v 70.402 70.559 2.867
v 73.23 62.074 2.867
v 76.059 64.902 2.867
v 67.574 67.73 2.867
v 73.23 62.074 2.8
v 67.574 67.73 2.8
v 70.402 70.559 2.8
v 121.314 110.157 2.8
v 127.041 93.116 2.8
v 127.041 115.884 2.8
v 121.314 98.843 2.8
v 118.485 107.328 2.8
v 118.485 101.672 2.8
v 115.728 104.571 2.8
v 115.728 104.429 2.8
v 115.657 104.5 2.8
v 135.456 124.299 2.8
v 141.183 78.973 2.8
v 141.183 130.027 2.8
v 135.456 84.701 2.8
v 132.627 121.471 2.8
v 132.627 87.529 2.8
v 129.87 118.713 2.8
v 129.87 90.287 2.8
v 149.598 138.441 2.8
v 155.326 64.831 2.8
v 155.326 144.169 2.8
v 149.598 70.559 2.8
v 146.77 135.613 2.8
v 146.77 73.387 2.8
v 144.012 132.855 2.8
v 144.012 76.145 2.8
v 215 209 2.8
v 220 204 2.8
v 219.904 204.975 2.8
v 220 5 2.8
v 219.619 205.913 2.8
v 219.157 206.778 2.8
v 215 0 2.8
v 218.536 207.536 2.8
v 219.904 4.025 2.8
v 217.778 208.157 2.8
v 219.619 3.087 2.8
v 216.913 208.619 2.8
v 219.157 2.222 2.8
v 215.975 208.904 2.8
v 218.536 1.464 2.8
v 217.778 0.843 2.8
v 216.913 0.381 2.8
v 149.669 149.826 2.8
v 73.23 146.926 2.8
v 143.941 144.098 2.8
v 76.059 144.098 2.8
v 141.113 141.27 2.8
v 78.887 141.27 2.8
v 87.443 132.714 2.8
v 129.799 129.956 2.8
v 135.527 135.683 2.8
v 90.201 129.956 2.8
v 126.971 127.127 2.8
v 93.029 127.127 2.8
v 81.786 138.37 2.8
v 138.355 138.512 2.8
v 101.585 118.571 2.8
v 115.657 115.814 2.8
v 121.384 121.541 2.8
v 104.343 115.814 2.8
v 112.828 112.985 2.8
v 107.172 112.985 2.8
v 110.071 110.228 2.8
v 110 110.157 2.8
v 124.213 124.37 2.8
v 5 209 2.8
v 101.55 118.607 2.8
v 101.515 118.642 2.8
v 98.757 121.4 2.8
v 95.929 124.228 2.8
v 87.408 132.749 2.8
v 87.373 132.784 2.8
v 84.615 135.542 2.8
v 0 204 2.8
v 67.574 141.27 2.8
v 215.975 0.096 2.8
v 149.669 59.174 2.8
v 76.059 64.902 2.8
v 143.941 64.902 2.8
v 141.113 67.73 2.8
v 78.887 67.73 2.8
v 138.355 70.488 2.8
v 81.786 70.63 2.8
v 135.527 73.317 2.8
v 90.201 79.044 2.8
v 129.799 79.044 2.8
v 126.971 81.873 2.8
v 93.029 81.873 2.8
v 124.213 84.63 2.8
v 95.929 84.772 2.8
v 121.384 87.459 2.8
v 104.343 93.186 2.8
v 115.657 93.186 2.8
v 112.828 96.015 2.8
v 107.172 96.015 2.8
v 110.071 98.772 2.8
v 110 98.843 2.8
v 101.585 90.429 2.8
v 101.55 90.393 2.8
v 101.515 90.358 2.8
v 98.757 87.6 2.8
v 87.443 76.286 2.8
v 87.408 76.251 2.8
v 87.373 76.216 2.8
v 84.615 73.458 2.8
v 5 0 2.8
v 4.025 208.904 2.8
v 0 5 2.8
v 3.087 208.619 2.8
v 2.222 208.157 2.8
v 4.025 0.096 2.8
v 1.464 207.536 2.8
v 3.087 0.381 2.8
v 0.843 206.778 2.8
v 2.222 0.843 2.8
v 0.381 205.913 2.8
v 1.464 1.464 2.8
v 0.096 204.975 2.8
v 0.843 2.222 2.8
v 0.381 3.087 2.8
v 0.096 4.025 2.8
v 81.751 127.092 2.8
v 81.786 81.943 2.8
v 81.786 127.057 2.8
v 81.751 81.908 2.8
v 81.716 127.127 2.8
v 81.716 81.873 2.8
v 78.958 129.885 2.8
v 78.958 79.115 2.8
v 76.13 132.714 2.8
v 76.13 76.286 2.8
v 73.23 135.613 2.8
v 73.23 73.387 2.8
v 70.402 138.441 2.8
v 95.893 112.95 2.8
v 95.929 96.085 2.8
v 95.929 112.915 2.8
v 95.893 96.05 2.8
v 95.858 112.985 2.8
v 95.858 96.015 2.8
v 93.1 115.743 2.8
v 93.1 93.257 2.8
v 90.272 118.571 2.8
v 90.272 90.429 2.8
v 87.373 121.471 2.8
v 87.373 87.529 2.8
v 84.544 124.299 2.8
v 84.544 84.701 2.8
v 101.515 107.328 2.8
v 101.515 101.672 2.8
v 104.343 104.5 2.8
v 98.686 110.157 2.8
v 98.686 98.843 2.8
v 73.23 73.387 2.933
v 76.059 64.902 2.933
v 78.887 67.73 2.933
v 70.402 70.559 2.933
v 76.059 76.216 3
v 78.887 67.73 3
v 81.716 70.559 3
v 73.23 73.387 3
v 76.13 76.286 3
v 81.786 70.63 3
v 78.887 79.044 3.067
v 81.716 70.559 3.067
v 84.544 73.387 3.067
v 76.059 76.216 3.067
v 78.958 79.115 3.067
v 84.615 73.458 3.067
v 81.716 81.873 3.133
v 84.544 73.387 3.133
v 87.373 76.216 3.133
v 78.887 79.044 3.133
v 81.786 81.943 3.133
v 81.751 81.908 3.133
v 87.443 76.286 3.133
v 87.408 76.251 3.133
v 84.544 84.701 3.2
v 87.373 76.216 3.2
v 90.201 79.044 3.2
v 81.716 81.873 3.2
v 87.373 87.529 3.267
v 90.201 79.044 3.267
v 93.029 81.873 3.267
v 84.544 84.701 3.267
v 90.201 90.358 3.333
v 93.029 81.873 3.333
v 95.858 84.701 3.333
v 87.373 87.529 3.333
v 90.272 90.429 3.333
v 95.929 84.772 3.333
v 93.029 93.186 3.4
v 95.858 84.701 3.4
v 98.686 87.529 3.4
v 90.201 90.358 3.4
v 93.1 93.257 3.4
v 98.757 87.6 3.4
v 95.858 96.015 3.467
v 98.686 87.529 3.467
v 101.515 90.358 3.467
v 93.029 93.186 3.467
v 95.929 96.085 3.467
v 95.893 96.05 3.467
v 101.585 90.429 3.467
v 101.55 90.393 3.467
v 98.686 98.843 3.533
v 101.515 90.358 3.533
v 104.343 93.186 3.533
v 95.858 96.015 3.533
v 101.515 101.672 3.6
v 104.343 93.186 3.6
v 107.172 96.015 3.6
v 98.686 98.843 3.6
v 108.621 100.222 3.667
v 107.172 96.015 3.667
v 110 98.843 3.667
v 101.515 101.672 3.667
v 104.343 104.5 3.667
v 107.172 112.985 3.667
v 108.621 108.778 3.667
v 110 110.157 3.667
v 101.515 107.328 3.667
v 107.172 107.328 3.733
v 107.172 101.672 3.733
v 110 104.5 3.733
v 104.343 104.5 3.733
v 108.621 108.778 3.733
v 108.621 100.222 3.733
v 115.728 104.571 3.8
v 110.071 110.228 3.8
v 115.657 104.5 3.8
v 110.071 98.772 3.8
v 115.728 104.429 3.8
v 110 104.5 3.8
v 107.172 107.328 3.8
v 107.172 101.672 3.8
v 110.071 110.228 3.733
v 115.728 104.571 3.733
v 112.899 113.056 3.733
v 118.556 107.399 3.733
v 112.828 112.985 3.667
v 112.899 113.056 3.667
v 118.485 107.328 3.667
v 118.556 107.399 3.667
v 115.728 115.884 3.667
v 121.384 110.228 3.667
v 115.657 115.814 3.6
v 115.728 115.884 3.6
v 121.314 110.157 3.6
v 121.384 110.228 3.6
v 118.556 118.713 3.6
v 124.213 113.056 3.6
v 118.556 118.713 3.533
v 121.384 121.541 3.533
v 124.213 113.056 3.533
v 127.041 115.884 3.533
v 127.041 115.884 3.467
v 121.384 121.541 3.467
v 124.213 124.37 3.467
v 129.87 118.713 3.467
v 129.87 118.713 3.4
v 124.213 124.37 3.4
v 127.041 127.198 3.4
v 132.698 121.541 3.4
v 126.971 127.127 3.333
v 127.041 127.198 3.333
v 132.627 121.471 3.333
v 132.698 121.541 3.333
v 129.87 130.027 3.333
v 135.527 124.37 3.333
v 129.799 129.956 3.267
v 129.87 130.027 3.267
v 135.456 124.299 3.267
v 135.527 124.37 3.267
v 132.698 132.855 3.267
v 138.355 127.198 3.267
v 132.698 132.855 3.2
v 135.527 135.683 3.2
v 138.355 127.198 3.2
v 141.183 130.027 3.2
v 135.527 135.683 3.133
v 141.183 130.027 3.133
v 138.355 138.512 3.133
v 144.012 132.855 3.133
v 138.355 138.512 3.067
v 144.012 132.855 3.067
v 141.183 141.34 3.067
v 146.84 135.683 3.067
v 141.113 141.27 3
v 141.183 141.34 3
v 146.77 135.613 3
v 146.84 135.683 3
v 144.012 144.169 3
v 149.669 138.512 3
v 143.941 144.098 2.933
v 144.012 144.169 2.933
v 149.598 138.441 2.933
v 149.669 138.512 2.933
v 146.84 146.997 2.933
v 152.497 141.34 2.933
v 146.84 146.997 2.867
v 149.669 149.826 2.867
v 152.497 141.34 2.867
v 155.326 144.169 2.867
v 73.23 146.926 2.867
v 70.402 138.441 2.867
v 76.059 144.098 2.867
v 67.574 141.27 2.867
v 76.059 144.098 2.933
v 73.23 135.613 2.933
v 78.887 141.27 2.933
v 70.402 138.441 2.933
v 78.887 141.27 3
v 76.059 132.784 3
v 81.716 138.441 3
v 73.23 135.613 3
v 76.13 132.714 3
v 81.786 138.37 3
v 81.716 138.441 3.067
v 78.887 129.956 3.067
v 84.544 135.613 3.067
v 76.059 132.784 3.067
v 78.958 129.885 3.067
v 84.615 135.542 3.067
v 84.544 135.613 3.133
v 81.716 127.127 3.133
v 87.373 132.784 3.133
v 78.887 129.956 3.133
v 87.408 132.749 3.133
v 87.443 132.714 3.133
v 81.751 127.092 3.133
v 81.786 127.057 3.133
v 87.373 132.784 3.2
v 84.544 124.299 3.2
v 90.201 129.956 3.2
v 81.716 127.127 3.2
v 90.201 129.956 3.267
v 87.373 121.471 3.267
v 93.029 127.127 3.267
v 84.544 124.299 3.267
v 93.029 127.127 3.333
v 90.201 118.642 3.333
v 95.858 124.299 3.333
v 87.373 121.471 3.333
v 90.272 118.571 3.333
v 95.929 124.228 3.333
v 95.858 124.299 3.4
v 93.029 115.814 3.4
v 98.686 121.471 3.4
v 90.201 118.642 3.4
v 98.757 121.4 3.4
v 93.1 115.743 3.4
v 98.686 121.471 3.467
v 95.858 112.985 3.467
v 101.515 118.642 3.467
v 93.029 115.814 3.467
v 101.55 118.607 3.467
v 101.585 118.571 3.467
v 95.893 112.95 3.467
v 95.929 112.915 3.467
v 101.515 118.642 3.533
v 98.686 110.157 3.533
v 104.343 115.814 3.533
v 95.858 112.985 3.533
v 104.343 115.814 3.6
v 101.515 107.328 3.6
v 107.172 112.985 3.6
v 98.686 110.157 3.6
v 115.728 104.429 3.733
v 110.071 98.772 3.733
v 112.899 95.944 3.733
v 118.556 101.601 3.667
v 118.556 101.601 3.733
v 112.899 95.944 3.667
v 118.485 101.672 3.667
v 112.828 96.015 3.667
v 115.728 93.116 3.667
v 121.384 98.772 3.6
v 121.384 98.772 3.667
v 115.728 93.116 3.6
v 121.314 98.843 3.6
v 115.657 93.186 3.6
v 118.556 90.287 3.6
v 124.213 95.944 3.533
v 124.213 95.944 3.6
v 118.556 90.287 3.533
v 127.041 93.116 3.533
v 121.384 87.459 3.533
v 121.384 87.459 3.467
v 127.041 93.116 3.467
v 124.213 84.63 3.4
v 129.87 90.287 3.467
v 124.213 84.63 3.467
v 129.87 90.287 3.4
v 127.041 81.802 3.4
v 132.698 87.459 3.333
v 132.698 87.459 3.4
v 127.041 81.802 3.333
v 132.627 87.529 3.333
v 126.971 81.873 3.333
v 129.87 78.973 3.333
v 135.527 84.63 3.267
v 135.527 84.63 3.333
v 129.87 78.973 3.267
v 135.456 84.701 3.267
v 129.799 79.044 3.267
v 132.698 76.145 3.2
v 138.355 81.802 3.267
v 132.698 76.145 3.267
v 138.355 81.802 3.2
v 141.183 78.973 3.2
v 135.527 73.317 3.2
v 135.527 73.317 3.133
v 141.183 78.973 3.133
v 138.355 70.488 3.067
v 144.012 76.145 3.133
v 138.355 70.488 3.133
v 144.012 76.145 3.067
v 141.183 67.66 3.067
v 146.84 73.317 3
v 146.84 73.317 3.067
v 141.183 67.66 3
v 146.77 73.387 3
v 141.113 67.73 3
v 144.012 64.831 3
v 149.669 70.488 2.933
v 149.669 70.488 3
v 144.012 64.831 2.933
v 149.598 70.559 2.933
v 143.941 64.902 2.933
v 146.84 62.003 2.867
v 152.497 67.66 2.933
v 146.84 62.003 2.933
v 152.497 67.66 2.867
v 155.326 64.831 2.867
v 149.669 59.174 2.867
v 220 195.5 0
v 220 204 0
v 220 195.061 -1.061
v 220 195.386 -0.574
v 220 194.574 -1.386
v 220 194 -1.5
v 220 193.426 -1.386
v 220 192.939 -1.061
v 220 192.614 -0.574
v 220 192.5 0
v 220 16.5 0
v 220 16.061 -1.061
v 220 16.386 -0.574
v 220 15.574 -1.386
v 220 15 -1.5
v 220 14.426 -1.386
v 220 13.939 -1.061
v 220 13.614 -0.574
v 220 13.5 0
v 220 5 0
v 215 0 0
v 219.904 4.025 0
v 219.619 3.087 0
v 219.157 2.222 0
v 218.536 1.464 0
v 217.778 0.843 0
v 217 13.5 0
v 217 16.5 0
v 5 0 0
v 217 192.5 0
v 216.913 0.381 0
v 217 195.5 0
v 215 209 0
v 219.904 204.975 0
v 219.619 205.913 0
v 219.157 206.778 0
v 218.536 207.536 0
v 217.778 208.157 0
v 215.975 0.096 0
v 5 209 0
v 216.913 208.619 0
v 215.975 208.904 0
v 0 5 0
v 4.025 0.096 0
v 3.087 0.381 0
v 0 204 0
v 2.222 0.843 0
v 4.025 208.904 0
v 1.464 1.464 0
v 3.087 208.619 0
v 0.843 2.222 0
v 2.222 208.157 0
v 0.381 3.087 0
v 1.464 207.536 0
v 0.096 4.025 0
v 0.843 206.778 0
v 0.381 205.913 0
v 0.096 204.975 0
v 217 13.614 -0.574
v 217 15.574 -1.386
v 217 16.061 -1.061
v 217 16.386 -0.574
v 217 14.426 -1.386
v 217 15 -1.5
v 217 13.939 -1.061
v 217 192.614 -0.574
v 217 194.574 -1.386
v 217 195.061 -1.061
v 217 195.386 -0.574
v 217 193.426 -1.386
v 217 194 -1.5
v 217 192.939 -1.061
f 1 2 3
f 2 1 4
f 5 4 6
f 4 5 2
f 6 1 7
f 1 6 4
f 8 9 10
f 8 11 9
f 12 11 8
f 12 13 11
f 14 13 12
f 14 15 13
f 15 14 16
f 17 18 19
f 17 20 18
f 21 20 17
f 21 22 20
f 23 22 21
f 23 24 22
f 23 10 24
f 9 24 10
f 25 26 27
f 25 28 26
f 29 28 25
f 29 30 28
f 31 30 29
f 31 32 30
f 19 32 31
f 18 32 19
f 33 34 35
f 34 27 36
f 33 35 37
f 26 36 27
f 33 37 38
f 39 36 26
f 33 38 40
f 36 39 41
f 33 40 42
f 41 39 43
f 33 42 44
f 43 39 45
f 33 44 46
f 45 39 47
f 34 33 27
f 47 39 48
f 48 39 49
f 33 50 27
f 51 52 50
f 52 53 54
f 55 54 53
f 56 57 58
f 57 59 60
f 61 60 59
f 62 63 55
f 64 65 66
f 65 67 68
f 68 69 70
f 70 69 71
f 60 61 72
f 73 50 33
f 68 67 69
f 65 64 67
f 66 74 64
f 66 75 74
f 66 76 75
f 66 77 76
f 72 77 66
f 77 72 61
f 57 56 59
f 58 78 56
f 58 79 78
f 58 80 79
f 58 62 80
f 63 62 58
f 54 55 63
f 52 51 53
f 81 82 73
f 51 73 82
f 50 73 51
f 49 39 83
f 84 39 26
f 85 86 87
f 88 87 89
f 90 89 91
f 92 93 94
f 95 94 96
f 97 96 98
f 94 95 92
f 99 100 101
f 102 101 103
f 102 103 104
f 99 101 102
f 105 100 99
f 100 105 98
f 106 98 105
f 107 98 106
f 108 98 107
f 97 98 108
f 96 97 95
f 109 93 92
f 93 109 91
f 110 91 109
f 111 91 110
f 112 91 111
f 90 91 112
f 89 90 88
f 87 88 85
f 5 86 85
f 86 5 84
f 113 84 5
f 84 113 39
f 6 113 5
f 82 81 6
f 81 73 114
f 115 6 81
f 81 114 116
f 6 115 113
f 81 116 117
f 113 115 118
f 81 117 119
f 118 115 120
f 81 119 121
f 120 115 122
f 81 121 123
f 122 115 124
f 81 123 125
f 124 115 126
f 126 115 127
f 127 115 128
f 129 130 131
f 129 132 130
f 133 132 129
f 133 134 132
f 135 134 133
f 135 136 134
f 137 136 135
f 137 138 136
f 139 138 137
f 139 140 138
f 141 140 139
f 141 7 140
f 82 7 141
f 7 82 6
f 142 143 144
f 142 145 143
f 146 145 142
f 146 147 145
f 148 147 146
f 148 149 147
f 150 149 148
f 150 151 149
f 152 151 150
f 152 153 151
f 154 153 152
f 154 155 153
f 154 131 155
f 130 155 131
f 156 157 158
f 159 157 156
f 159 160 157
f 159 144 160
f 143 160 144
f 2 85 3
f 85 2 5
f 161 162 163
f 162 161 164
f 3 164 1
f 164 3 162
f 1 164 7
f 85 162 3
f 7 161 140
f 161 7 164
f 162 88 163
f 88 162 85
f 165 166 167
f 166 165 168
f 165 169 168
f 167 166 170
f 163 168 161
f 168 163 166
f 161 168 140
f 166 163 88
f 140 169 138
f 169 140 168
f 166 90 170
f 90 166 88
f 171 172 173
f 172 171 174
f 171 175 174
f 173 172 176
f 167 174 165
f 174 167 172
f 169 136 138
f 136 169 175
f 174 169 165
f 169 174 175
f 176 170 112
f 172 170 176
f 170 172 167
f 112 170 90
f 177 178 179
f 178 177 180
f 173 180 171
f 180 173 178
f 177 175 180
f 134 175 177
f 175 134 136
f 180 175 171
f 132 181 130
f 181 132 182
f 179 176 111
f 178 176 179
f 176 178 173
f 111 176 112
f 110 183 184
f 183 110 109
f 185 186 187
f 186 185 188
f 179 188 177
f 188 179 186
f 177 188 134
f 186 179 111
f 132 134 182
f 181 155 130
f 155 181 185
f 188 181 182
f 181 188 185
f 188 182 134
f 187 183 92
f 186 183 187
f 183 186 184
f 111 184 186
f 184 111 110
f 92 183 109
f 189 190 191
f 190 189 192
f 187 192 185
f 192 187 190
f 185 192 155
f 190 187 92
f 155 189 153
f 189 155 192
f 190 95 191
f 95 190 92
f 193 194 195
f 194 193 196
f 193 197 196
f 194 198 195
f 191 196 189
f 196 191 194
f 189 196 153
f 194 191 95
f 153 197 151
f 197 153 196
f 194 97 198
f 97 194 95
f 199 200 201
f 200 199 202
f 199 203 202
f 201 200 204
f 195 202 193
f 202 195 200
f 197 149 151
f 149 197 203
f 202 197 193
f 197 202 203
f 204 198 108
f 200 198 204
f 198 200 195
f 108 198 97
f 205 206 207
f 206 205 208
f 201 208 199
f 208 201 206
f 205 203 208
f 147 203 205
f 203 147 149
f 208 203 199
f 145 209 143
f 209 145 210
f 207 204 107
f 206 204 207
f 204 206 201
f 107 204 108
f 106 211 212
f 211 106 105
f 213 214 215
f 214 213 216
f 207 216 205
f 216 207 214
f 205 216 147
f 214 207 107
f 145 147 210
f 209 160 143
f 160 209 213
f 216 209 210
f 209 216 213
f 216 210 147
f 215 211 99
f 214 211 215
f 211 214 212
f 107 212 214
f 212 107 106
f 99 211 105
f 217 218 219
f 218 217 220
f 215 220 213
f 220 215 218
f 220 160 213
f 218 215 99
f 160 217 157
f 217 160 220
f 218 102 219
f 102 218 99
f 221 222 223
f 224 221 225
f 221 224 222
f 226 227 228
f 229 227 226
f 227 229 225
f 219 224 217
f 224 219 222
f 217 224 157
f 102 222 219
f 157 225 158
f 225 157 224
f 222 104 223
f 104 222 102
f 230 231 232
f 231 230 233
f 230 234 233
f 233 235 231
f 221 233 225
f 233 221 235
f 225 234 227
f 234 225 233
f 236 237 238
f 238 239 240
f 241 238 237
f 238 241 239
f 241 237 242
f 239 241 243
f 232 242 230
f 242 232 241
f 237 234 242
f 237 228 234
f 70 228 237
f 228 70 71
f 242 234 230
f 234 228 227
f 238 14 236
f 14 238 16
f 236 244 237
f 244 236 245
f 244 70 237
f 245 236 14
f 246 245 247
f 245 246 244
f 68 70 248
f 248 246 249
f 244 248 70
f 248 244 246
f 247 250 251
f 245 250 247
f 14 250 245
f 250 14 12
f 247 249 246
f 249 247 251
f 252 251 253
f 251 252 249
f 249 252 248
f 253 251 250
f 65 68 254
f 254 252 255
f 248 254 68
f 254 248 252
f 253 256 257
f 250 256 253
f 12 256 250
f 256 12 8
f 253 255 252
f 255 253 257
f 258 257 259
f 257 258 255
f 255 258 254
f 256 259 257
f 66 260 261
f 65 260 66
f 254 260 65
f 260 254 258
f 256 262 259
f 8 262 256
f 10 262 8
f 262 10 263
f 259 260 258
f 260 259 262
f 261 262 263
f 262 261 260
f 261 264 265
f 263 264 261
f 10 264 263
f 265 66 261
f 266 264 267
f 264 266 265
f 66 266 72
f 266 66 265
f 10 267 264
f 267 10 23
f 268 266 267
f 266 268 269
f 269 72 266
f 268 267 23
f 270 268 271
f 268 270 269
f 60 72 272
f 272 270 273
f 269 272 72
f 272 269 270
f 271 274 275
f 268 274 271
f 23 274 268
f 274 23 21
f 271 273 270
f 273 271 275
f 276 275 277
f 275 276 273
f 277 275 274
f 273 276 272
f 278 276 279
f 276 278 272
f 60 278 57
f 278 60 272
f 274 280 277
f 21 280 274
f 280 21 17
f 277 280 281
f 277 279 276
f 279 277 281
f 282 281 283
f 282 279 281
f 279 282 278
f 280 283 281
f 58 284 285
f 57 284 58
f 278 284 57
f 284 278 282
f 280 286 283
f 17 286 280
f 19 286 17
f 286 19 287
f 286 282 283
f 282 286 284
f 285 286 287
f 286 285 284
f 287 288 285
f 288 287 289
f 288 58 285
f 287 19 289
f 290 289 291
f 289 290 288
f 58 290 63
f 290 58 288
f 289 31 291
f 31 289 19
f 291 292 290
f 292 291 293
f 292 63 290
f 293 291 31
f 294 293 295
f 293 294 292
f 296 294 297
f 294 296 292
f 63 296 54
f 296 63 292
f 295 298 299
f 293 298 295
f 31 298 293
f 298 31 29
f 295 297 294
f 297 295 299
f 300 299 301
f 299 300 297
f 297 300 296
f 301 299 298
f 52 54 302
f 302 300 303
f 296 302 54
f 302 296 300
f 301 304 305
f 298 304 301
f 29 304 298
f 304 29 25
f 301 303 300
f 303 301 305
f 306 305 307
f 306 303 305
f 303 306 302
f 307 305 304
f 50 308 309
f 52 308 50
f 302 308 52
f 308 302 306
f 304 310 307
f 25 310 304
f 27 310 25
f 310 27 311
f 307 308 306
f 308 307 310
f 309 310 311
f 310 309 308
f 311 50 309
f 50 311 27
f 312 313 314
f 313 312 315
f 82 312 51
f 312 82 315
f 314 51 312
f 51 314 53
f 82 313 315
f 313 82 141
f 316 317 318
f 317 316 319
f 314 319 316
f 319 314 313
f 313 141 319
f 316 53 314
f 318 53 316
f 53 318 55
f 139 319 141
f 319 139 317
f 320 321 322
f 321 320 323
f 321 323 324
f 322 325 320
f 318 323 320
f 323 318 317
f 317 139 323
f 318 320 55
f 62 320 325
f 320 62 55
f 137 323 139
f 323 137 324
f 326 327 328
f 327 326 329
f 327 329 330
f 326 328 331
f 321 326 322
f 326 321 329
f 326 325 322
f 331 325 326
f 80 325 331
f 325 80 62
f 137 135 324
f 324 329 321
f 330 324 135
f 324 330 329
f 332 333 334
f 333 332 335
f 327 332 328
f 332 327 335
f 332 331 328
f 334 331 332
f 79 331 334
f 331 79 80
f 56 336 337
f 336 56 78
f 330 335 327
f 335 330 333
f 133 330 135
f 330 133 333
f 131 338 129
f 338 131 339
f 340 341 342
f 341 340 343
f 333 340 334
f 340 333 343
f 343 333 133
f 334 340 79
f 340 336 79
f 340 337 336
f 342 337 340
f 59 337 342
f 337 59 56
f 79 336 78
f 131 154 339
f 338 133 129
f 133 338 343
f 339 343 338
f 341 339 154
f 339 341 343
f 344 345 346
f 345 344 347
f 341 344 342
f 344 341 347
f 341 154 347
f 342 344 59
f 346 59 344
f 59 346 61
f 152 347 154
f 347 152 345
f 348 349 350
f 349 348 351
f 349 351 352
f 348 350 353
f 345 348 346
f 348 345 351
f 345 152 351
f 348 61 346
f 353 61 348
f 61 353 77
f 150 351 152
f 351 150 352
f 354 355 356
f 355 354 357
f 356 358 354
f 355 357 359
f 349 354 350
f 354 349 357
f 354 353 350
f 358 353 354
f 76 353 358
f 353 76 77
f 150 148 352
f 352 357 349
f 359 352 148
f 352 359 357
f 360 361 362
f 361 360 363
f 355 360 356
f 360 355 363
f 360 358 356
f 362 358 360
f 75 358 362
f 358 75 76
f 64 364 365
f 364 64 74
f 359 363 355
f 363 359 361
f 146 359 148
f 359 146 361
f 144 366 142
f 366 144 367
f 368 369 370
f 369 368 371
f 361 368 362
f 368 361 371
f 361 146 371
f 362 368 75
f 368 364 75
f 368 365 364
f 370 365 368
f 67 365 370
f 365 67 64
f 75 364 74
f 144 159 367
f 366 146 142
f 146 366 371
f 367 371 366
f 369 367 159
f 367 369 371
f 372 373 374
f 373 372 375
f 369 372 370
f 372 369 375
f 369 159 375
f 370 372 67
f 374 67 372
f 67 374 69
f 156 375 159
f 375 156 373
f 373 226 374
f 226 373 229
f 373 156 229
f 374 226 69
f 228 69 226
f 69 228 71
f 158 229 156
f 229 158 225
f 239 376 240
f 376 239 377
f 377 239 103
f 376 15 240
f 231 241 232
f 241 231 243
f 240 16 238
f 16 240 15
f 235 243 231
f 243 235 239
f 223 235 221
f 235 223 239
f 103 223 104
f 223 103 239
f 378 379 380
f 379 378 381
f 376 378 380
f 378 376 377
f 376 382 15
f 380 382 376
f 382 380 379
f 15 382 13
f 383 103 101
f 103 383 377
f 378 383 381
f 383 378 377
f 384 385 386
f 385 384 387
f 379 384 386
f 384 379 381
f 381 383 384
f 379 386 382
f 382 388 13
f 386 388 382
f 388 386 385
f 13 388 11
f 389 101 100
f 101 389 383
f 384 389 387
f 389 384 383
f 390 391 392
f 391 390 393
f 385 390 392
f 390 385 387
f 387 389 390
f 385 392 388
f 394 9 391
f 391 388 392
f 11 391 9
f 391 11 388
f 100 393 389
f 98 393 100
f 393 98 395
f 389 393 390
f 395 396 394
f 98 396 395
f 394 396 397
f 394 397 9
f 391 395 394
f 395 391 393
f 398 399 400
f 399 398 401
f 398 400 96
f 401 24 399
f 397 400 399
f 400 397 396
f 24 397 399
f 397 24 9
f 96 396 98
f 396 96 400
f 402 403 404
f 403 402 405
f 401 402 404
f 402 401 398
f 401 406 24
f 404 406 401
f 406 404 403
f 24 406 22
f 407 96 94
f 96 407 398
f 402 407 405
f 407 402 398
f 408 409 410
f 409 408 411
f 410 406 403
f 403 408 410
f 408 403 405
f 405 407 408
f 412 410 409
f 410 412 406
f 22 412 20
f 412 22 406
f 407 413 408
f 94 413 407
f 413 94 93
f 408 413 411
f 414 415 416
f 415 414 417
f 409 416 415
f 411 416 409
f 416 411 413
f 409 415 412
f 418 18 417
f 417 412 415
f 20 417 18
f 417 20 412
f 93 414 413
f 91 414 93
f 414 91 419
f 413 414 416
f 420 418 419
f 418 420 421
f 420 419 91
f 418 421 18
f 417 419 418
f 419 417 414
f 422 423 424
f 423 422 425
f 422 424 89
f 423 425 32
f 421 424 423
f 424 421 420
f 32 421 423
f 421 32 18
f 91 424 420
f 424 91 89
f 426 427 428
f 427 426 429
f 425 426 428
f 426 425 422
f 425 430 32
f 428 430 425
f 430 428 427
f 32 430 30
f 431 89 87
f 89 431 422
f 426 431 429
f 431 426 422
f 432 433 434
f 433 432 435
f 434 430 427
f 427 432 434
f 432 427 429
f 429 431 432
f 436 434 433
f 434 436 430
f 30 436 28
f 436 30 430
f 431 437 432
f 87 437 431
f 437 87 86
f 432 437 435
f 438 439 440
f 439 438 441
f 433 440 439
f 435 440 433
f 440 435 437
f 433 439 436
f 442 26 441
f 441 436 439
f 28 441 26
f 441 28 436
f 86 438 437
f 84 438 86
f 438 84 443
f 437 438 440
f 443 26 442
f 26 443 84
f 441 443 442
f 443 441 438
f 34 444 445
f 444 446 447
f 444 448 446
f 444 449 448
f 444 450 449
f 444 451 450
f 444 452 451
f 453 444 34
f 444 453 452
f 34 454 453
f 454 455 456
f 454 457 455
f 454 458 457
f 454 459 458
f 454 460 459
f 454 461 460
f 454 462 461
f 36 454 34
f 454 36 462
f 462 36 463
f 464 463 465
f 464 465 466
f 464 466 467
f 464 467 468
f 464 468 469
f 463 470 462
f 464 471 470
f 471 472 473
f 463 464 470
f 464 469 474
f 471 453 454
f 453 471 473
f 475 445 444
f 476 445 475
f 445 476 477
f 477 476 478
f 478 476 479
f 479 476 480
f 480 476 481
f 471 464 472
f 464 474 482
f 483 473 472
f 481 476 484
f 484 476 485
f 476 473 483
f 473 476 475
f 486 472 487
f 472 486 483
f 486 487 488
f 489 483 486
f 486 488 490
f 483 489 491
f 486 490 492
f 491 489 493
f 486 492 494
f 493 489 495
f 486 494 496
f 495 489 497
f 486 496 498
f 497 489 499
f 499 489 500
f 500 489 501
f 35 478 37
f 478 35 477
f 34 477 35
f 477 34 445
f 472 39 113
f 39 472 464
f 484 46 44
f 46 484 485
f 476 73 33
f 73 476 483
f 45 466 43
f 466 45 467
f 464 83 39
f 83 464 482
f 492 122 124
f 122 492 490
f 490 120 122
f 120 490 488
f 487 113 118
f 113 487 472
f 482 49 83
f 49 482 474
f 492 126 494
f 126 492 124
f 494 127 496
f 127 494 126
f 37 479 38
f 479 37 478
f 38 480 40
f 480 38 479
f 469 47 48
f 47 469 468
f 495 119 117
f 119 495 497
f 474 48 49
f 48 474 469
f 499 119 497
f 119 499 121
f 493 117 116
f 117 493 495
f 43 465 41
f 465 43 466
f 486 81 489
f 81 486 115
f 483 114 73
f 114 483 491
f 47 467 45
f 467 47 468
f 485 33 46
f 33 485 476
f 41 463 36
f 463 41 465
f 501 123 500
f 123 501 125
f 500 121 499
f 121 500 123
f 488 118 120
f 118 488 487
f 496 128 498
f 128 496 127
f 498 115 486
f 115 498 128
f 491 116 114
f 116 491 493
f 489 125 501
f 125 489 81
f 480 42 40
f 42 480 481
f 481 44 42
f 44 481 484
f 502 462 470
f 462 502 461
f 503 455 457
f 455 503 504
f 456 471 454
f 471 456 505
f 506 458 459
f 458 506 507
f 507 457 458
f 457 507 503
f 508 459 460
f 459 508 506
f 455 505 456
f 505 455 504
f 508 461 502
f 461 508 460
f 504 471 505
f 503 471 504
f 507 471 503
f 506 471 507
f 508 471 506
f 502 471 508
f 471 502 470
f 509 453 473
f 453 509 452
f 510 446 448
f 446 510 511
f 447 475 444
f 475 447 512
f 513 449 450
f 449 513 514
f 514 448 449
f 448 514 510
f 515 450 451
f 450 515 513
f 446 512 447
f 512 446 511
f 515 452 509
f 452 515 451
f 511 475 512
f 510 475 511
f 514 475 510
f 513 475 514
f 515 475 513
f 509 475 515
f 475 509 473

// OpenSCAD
// 机箱前面板 - A块 (220mm × 209mm × 2.8mm)
// 燕尾榫拼接 (凸榫)

// 参数
width = 220;     // 宽度 (mm)
height = 209;    // 高度 (mm)
thickness = 2.8; // 厚度 (mm)
corner_radius = 5;  // 倒角半径 (mm)

// 燕尾榫参数
dovetail_width = 15;    // 燕尾宽度 (mm)
dovetail_depth = 6;     // 燕尾深度 (mm)
dovetail_angle = 45;    // 燕尾角度 (度)
dovetail_count = 4;     // 燕尾数量
tolerance = 0.35;        // 配合间隙 (mm)

// 计算燕尾实际尺寸
dovetail_offset = tan(dovetail_angle) * thickness;
dovetail_base_width = dovetail_width - 2 * dovetail_offset;

// 定位销参数
pin_radius = 1.5;
pin_height = 2.5;

// X 图案参数
x_max_height = 1.0;
x_width = 8;
x_diagonal = 120;

// 圆角矩形模块
module rounded_rect(w, h, r, t) {
    hull() {
        translate([r, r, 0]) cylinder(h = t, r = r, $fn = 32);
        translate([w - r, r, 0]) cylinder(h = t, r = r, $fn = 32);
        translate([w - r, h - r, 0]) cylinder(h = t, r = r, $fn = 32);
        translate([r, h - r, 0]) cylinder(h = t, r = r, $fn = 32);
    }
}

// 单个凸燕尾
module dovetail_protrusion(y_pos) {
    half_width = dovetail_width / 2;
    half_offset = dovetail_offset / 2;
    base_half_width = half_width - half_offset;

    translate([width, y_pos, 0])
    rotate([0, -90, 0])
    linear_extrude(height = dovetail_depth, convexity = 3)
    polygon(points = [
        [0, -half_width],              // 左上角
        [0, half_width],               // 右上角
        [thickness, base_half_width],  // 右下角（燕尾）
        [thickness, -base_half_width]  // 左下角（燕尾）
    ]);
}

// 定位凸销
module alignment_pin(y_pos) {
    translate([width, y_pos, 0])
    rotate([0, -90, 0])
    cylinder(h = 3, r = pin_radius, $fn = 16);
}

// 创建主体
difference() {
    union() {
        // 前面板主体
        color("LightGray") {
            rounded_rect(width, height, corner_radius, thickness);
        }

        // X 图案
        translate([width/2, height/2, 0])
        x_pattern_scaled();

        // 燕尾凸起
        color("DarkGray") {
            for (i = [0:dovetail_count-1]) {
                dovetail_protrusion(30 + (i + 1) * ((height - 60) / (dovetail_count + 1)));
            }
        }

        // 定位凸销
        alignment_pin(15);
        alignment_pin(height - 15);
    }
}

// 缩放后的X图案
module x_pattern_scaled() {
    segments = 30;
    segment_length = x_diagonal / segments;

    union() {
        for (i = [-segments/2:segments/2-1]) {
            dist_ratio = abs(i) / (segments/2);
            current_height = x_max_height * (1 - dist_ratio);

            translate([0, 0, thickness])
            rotate([0, 0, 45])
            translate([i * segment_length, -x_width/2, 0])
            cube([segment_length + 0.1, x_width, current_height]);
        }

        for (i = [-segments/2:segments/2-1]) {
            dist_ratio = abs(i) / (segments/2);
            current_height = x_max_height * (1 - dist_ratio);

            translate([0, 0, thickness])
            rotate([0, 0, -45])
            translate([i * segment_length, -x_width/2, 0])
            cube([segment_length + 0.1, x_width, current_height]);
        }
    }
}
